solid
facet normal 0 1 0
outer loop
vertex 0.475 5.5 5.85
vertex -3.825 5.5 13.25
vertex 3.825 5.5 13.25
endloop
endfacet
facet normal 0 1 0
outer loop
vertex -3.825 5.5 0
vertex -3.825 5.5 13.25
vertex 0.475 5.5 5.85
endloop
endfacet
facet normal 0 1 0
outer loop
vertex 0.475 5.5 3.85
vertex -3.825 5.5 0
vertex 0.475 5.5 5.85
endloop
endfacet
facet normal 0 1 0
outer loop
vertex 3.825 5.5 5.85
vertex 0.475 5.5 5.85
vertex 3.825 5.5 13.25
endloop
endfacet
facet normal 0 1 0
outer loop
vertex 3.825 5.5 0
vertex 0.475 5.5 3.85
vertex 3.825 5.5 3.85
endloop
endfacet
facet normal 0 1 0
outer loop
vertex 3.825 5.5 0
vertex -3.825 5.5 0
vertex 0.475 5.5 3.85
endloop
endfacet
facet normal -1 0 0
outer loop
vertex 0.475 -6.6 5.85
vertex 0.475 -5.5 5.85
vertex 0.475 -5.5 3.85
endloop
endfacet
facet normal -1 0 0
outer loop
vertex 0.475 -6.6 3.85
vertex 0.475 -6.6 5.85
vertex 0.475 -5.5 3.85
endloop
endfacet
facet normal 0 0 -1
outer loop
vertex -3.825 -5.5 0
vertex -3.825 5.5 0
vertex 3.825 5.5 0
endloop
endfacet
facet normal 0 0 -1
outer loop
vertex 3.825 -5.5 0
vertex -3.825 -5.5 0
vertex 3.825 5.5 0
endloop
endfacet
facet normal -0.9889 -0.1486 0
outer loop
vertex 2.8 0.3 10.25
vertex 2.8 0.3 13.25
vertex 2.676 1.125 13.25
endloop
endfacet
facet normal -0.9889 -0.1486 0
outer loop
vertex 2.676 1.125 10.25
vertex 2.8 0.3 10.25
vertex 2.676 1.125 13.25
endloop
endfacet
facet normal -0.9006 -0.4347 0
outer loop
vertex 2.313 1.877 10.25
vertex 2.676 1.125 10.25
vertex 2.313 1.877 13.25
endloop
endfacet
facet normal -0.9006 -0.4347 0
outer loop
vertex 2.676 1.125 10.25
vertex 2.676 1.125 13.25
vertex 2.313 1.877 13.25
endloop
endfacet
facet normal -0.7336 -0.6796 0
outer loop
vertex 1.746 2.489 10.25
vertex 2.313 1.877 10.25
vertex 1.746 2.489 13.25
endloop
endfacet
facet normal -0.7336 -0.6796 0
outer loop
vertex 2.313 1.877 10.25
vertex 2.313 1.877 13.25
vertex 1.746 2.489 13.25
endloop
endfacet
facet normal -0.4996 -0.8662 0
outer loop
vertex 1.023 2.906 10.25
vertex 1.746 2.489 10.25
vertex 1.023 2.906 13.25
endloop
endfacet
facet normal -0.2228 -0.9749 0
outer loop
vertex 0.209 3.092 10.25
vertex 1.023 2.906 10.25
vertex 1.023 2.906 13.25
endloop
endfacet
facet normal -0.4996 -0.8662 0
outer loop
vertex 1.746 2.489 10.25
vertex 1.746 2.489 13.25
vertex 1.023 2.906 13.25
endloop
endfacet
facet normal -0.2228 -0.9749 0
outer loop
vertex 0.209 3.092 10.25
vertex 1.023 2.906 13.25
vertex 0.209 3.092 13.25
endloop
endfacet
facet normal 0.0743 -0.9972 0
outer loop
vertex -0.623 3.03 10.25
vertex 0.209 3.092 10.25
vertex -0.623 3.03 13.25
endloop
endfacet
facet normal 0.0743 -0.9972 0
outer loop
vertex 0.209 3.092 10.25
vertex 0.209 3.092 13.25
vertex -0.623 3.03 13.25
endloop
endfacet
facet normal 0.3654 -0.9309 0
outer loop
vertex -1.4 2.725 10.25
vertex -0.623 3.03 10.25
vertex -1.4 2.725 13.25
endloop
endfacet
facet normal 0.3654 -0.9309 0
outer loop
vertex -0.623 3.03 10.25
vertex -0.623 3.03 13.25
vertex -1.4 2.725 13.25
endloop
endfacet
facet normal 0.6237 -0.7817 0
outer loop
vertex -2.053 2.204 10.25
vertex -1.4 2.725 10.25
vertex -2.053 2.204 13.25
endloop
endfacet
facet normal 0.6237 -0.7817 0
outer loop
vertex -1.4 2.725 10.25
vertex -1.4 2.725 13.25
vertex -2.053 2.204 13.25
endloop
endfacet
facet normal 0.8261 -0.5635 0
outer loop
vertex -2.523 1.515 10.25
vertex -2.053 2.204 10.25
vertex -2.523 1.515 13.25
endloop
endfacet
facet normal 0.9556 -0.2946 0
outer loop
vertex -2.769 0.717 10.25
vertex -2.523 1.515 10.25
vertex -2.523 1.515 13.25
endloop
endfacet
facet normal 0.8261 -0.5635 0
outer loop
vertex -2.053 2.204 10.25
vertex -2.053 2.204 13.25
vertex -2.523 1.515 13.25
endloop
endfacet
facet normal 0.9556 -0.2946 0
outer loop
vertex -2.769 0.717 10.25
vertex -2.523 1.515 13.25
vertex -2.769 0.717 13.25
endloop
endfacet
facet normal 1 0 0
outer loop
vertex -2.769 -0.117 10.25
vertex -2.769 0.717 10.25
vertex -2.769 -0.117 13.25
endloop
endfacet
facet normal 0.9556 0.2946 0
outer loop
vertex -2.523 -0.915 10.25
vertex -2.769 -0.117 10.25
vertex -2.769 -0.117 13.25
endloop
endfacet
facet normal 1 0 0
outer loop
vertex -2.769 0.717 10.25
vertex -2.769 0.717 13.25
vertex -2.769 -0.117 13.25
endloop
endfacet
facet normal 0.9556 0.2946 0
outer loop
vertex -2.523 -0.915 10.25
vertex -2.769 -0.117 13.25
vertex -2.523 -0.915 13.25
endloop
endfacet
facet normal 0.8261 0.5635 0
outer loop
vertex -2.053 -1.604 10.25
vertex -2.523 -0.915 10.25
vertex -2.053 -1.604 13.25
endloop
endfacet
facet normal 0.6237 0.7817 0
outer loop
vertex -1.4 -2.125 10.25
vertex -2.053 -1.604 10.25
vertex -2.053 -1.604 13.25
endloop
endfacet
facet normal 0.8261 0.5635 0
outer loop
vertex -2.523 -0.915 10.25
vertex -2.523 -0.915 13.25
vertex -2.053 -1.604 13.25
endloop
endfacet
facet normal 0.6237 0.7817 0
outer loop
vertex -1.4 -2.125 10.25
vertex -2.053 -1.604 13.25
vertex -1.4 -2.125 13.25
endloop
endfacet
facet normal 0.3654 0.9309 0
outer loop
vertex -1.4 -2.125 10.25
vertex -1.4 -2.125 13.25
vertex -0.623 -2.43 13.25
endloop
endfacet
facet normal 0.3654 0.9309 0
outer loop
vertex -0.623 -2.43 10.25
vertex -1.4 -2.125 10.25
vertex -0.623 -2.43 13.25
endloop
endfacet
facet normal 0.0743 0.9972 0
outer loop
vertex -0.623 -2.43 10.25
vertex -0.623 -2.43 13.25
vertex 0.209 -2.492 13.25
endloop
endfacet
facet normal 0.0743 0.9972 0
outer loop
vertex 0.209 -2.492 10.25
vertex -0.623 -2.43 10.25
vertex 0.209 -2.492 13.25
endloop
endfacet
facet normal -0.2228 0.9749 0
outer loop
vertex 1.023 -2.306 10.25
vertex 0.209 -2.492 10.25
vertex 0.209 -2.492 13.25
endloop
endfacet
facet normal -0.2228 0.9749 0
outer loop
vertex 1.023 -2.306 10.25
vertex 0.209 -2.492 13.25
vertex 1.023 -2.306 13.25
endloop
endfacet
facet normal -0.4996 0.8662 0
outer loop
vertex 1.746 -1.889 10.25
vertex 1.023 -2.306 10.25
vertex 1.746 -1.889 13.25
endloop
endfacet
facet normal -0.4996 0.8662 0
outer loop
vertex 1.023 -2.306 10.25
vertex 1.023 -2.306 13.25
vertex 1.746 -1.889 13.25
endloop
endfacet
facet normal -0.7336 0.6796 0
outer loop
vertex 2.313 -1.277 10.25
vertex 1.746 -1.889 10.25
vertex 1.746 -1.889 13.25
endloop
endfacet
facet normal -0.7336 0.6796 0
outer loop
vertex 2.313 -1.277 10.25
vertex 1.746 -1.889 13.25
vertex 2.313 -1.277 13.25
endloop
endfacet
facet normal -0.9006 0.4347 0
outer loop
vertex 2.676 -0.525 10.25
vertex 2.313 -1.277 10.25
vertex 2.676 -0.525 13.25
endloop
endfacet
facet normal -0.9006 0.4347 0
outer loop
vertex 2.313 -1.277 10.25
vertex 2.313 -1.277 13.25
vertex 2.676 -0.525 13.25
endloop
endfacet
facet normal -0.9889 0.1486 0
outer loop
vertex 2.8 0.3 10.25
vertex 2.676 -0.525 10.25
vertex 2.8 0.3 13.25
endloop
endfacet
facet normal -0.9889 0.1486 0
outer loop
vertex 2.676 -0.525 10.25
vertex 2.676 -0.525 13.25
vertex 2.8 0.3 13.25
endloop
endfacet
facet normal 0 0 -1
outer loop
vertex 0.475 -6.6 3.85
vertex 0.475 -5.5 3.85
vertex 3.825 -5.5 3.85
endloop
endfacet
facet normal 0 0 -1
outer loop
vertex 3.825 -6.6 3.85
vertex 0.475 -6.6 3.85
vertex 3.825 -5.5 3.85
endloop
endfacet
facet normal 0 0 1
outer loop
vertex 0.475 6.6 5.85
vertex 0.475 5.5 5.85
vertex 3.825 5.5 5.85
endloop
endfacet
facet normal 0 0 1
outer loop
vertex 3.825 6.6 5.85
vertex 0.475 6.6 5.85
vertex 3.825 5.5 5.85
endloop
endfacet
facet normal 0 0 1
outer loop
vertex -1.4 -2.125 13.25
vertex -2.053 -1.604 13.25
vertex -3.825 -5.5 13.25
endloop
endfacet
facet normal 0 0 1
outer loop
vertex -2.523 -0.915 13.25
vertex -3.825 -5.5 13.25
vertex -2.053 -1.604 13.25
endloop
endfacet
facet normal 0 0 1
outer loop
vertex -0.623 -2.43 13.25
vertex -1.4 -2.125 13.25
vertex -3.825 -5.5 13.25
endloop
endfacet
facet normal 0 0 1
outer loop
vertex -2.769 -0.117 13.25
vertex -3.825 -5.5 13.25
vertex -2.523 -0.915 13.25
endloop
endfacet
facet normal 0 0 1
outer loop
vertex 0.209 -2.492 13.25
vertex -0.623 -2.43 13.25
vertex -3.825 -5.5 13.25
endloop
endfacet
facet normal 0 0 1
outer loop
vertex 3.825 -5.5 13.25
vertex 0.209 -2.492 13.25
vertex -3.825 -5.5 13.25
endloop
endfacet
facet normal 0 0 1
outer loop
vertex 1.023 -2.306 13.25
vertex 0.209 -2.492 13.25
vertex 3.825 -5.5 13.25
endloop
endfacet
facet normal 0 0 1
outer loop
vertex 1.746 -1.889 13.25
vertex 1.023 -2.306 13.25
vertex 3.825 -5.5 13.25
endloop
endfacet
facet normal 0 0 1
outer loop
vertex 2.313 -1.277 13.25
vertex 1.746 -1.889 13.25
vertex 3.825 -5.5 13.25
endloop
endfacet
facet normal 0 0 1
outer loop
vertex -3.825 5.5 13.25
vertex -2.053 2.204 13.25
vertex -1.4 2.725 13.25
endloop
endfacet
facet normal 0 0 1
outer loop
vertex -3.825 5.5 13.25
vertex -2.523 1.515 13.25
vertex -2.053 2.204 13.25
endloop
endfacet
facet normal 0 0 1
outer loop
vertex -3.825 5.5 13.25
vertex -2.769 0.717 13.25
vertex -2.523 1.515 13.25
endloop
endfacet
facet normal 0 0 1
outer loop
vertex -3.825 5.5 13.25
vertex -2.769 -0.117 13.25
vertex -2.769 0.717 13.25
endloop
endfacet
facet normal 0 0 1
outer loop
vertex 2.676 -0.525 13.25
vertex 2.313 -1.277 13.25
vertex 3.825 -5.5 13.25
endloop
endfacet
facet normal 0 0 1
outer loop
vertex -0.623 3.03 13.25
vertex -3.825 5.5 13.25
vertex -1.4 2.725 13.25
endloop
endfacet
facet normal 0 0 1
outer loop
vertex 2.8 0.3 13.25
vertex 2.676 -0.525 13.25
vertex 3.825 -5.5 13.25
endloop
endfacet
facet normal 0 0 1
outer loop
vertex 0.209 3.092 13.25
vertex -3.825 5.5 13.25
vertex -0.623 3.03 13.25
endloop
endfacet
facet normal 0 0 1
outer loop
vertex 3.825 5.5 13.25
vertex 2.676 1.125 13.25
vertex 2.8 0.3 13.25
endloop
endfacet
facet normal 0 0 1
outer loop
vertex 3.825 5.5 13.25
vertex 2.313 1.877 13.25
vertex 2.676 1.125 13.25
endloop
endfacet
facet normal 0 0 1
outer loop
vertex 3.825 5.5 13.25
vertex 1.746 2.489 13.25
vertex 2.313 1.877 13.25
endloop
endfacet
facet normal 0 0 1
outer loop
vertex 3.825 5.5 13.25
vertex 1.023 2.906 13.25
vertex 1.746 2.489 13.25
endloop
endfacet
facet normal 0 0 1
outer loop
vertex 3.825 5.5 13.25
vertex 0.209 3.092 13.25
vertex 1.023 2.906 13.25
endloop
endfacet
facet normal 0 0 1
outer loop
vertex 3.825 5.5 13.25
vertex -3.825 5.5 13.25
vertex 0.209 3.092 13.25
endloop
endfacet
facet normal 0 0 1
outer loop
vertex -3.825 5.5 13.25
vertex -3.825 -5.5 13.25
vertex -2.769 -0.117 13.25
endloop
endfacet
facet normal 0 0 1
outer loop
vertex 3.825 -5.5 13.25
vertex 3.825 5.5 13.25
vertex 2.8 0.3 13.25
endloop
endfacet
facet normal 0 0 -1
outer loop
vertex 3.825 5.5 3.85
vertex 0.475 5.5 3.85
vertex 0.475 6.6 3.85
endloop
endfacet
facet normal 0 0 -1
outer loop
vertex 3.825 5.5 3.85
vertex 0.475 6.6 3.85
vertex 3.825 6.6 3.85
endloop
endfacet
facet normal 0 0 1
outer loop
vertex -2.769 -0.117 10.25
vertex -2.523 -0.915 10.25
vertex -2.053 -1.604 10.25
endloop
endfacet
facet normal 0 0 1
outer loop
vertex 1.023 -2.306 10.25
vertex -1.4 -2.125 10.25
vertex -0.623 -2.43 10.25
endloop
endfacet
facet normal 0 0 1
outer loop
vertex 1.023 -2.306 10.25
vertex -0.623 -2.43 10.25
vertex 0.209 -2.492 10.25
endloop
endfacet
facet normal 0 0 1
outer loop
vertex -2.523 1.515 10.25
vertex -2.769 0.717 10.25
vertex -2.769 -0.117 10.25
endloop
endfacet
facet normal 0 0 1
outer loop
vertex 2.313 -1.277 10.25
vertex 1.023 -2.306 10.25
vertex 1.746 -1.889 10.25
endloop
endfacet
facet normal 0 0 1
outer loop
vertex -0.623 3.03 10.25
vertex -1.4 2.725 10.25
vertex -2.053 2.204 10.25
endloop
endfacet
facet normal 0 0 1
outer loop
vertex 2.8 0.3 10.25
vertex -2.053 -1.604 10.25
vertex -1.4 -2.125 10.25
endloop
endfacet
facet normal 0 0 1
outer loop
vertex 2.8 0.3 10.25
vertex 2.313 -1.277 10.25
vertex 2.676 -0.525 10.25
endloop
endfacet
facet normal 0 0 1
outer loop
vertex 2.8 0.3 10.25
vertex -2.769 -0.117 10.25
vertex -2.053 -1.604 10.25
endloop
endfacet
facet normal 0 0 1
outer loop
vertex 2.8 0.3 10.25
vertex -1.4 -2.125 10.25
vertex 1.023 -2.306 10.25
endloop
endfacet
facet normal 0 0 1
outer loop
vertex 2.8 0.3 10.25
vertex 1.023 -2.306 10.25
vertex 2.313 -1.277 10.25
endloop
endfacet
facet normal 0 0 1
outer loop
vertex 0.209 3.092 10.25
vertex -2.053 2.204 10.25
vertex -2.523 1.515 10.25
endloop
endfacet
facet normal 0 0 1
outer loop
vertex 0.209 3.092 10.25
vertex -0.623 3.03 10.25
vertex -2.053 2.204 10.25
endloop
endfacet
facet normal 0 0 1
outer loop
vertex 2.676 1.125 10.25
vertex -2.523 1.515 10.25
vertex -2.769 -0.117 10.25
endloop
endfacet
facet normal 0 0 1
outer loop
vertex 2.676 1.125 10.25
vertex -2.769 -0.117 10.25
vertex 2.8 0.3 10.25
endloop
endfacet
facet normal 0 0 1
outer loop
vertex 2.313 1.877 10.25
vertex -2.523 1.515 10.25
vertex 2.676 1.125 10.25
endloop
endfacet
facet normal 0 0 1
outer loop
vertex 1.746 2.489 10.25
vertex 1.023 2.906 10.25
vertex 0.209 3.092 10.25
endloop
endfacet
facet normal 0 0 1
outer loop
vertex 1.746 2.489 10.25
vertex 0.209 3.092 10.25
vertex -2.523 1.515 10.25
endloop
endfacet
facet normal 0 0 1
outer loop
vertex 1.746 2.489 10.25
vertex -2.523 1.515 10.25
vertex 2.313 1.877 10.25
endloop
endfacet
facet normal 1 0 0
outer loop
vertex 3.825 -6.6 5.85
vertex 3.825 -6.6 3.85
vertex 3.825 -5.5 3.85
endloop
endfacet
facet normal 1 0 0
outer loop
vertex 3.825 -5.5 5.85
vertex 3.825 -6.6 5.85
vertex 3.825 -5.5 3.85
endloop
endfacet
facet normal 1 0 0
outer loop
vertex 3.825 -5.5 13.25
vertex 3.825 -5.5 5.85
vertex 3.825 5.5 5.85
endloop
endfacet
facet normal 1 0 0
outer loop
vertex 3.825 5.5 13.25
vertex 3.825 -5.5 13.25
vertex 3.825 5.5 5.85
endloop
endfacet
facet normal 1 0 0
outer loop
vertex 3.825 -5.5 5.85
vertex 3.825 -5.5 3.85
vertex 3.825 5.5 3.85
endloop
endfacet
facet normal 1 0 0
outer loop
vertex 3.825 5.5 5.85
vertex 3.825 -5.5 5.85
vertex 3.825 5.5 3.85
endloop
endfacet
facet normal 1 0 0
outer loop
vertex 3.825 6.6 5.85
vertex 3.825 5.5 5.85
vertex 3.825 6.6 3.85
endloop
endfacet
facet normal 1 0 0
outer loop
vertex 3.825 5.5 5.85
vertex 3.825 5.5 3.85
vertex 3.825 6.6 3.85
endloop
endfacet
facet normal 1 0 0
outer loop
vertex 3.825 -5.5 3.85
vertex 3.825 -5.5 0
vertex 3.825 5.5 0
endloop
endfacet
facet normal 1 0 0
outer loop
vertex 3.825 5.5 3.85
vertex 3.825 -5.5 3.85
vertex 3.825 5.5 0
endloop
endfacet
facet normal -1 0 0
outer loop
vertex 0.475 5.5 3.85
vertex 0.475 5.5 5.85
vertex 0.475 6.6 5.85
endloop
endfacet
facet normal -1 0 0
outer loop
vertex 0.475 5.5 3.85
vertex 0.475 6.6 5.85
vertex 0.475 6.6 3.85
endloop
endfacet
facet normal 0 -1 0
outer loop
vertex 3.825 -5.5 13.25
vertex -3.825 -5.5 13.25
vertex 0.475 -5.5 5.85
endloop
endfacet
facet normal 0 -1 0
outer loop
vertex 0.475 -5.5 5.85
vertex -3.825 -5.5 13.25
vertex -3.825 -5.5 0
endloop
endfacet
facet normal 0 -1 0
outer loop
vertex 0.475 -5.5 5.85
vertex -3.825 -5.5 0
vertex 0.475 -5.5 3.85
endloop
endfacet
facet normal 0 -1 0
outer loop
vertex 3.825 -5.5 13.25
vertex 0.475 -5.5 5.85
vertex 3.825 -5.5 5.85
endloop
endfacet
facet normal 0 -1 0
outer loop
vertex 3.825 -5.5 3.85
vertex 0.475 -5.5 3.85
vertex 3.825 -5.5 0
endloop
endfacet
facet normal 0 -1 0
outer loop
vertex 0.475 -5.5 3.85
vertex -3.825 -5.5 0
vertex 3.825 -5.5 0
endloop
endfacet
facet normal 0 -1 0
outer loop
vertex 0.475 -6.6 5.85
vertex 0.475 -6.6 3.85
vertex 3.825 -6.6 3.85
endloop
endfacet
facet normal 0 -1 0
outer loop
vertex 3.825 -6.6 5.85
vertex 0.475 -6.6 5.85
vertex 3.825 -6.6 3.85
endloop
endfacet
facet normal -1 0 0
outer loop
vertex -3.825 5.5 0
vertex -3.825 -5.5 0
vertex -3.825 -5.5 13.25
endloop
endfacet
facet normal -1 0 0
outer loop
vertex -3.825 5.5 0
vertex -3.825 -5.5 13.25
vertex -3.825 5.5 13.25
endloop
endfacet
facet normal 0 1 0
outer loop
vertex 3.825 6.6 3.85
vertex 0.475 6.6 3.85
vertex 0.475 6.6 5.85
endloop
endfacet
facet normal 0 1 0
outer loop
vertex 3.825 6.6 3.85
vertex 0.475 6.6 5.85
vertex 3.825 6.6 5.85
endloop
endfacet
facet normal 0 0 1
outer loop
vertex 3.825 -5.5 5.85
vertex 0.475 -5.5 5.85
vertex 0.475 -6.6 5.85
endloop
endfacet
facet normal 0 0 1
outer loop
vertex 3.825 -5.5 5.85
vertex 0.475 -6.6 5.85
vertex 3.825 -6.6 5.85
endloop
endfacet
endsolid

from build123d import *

# Parameters (mm, degrees)
SKETCH_1_W          = 7.65
SKETCH_1_H          = 11
EXTRUDE_1_DEPTH     = 13.25
SKETCH_2_W          = 3.35
SKETCH_2_H          = 2
EXTRUDE_2_DEPTH     = 1.1
SKETCH_3_R          = 2.8
CUT_EXTRUDE_1_DEPTH = 3


with BuildPart() as part:
    # Эскиз1 → Бобышка-Вытянуть1 (new body)
    with BuildSketch(Plane.XY):
        Rectangle(SKETCH_1_W, SKETCH_1_H)
    extrude(amount=EXTRUDE_1_DEPTH)

    # Эскиз2 → Бобышка-Вытянуть2 (add)
    with BuildSketch(Plane(origin=(0, 5.5, 0), x_dir=(1, 0, 0), z_dir=(0, 1, 0))):
        with Locations((2.15, -4.85)):
            Rectangle(SKETCH_2_W, SKETCH_2_H)
    extrude_2 = extrude(amount=EXTRUDE_2_DEPTH)

    # Зеркальное отражение1: Бобышка-Вытянуть2 across plane
    add(extrude_2.mirror(Plane.ZX))

    # Эскиз3 → Вырез-Вытянуть1 (cut)
    with BuildSketch(Plane.XY.offset(13.25)):
        with Locations((0, 0.3)):
            Circle(SKETCH_3_R)
    extrude(amount=-CUT_EXTRUDE_1_DEPTH, mode=Mode.SUBTRACT)


solid = part.part
